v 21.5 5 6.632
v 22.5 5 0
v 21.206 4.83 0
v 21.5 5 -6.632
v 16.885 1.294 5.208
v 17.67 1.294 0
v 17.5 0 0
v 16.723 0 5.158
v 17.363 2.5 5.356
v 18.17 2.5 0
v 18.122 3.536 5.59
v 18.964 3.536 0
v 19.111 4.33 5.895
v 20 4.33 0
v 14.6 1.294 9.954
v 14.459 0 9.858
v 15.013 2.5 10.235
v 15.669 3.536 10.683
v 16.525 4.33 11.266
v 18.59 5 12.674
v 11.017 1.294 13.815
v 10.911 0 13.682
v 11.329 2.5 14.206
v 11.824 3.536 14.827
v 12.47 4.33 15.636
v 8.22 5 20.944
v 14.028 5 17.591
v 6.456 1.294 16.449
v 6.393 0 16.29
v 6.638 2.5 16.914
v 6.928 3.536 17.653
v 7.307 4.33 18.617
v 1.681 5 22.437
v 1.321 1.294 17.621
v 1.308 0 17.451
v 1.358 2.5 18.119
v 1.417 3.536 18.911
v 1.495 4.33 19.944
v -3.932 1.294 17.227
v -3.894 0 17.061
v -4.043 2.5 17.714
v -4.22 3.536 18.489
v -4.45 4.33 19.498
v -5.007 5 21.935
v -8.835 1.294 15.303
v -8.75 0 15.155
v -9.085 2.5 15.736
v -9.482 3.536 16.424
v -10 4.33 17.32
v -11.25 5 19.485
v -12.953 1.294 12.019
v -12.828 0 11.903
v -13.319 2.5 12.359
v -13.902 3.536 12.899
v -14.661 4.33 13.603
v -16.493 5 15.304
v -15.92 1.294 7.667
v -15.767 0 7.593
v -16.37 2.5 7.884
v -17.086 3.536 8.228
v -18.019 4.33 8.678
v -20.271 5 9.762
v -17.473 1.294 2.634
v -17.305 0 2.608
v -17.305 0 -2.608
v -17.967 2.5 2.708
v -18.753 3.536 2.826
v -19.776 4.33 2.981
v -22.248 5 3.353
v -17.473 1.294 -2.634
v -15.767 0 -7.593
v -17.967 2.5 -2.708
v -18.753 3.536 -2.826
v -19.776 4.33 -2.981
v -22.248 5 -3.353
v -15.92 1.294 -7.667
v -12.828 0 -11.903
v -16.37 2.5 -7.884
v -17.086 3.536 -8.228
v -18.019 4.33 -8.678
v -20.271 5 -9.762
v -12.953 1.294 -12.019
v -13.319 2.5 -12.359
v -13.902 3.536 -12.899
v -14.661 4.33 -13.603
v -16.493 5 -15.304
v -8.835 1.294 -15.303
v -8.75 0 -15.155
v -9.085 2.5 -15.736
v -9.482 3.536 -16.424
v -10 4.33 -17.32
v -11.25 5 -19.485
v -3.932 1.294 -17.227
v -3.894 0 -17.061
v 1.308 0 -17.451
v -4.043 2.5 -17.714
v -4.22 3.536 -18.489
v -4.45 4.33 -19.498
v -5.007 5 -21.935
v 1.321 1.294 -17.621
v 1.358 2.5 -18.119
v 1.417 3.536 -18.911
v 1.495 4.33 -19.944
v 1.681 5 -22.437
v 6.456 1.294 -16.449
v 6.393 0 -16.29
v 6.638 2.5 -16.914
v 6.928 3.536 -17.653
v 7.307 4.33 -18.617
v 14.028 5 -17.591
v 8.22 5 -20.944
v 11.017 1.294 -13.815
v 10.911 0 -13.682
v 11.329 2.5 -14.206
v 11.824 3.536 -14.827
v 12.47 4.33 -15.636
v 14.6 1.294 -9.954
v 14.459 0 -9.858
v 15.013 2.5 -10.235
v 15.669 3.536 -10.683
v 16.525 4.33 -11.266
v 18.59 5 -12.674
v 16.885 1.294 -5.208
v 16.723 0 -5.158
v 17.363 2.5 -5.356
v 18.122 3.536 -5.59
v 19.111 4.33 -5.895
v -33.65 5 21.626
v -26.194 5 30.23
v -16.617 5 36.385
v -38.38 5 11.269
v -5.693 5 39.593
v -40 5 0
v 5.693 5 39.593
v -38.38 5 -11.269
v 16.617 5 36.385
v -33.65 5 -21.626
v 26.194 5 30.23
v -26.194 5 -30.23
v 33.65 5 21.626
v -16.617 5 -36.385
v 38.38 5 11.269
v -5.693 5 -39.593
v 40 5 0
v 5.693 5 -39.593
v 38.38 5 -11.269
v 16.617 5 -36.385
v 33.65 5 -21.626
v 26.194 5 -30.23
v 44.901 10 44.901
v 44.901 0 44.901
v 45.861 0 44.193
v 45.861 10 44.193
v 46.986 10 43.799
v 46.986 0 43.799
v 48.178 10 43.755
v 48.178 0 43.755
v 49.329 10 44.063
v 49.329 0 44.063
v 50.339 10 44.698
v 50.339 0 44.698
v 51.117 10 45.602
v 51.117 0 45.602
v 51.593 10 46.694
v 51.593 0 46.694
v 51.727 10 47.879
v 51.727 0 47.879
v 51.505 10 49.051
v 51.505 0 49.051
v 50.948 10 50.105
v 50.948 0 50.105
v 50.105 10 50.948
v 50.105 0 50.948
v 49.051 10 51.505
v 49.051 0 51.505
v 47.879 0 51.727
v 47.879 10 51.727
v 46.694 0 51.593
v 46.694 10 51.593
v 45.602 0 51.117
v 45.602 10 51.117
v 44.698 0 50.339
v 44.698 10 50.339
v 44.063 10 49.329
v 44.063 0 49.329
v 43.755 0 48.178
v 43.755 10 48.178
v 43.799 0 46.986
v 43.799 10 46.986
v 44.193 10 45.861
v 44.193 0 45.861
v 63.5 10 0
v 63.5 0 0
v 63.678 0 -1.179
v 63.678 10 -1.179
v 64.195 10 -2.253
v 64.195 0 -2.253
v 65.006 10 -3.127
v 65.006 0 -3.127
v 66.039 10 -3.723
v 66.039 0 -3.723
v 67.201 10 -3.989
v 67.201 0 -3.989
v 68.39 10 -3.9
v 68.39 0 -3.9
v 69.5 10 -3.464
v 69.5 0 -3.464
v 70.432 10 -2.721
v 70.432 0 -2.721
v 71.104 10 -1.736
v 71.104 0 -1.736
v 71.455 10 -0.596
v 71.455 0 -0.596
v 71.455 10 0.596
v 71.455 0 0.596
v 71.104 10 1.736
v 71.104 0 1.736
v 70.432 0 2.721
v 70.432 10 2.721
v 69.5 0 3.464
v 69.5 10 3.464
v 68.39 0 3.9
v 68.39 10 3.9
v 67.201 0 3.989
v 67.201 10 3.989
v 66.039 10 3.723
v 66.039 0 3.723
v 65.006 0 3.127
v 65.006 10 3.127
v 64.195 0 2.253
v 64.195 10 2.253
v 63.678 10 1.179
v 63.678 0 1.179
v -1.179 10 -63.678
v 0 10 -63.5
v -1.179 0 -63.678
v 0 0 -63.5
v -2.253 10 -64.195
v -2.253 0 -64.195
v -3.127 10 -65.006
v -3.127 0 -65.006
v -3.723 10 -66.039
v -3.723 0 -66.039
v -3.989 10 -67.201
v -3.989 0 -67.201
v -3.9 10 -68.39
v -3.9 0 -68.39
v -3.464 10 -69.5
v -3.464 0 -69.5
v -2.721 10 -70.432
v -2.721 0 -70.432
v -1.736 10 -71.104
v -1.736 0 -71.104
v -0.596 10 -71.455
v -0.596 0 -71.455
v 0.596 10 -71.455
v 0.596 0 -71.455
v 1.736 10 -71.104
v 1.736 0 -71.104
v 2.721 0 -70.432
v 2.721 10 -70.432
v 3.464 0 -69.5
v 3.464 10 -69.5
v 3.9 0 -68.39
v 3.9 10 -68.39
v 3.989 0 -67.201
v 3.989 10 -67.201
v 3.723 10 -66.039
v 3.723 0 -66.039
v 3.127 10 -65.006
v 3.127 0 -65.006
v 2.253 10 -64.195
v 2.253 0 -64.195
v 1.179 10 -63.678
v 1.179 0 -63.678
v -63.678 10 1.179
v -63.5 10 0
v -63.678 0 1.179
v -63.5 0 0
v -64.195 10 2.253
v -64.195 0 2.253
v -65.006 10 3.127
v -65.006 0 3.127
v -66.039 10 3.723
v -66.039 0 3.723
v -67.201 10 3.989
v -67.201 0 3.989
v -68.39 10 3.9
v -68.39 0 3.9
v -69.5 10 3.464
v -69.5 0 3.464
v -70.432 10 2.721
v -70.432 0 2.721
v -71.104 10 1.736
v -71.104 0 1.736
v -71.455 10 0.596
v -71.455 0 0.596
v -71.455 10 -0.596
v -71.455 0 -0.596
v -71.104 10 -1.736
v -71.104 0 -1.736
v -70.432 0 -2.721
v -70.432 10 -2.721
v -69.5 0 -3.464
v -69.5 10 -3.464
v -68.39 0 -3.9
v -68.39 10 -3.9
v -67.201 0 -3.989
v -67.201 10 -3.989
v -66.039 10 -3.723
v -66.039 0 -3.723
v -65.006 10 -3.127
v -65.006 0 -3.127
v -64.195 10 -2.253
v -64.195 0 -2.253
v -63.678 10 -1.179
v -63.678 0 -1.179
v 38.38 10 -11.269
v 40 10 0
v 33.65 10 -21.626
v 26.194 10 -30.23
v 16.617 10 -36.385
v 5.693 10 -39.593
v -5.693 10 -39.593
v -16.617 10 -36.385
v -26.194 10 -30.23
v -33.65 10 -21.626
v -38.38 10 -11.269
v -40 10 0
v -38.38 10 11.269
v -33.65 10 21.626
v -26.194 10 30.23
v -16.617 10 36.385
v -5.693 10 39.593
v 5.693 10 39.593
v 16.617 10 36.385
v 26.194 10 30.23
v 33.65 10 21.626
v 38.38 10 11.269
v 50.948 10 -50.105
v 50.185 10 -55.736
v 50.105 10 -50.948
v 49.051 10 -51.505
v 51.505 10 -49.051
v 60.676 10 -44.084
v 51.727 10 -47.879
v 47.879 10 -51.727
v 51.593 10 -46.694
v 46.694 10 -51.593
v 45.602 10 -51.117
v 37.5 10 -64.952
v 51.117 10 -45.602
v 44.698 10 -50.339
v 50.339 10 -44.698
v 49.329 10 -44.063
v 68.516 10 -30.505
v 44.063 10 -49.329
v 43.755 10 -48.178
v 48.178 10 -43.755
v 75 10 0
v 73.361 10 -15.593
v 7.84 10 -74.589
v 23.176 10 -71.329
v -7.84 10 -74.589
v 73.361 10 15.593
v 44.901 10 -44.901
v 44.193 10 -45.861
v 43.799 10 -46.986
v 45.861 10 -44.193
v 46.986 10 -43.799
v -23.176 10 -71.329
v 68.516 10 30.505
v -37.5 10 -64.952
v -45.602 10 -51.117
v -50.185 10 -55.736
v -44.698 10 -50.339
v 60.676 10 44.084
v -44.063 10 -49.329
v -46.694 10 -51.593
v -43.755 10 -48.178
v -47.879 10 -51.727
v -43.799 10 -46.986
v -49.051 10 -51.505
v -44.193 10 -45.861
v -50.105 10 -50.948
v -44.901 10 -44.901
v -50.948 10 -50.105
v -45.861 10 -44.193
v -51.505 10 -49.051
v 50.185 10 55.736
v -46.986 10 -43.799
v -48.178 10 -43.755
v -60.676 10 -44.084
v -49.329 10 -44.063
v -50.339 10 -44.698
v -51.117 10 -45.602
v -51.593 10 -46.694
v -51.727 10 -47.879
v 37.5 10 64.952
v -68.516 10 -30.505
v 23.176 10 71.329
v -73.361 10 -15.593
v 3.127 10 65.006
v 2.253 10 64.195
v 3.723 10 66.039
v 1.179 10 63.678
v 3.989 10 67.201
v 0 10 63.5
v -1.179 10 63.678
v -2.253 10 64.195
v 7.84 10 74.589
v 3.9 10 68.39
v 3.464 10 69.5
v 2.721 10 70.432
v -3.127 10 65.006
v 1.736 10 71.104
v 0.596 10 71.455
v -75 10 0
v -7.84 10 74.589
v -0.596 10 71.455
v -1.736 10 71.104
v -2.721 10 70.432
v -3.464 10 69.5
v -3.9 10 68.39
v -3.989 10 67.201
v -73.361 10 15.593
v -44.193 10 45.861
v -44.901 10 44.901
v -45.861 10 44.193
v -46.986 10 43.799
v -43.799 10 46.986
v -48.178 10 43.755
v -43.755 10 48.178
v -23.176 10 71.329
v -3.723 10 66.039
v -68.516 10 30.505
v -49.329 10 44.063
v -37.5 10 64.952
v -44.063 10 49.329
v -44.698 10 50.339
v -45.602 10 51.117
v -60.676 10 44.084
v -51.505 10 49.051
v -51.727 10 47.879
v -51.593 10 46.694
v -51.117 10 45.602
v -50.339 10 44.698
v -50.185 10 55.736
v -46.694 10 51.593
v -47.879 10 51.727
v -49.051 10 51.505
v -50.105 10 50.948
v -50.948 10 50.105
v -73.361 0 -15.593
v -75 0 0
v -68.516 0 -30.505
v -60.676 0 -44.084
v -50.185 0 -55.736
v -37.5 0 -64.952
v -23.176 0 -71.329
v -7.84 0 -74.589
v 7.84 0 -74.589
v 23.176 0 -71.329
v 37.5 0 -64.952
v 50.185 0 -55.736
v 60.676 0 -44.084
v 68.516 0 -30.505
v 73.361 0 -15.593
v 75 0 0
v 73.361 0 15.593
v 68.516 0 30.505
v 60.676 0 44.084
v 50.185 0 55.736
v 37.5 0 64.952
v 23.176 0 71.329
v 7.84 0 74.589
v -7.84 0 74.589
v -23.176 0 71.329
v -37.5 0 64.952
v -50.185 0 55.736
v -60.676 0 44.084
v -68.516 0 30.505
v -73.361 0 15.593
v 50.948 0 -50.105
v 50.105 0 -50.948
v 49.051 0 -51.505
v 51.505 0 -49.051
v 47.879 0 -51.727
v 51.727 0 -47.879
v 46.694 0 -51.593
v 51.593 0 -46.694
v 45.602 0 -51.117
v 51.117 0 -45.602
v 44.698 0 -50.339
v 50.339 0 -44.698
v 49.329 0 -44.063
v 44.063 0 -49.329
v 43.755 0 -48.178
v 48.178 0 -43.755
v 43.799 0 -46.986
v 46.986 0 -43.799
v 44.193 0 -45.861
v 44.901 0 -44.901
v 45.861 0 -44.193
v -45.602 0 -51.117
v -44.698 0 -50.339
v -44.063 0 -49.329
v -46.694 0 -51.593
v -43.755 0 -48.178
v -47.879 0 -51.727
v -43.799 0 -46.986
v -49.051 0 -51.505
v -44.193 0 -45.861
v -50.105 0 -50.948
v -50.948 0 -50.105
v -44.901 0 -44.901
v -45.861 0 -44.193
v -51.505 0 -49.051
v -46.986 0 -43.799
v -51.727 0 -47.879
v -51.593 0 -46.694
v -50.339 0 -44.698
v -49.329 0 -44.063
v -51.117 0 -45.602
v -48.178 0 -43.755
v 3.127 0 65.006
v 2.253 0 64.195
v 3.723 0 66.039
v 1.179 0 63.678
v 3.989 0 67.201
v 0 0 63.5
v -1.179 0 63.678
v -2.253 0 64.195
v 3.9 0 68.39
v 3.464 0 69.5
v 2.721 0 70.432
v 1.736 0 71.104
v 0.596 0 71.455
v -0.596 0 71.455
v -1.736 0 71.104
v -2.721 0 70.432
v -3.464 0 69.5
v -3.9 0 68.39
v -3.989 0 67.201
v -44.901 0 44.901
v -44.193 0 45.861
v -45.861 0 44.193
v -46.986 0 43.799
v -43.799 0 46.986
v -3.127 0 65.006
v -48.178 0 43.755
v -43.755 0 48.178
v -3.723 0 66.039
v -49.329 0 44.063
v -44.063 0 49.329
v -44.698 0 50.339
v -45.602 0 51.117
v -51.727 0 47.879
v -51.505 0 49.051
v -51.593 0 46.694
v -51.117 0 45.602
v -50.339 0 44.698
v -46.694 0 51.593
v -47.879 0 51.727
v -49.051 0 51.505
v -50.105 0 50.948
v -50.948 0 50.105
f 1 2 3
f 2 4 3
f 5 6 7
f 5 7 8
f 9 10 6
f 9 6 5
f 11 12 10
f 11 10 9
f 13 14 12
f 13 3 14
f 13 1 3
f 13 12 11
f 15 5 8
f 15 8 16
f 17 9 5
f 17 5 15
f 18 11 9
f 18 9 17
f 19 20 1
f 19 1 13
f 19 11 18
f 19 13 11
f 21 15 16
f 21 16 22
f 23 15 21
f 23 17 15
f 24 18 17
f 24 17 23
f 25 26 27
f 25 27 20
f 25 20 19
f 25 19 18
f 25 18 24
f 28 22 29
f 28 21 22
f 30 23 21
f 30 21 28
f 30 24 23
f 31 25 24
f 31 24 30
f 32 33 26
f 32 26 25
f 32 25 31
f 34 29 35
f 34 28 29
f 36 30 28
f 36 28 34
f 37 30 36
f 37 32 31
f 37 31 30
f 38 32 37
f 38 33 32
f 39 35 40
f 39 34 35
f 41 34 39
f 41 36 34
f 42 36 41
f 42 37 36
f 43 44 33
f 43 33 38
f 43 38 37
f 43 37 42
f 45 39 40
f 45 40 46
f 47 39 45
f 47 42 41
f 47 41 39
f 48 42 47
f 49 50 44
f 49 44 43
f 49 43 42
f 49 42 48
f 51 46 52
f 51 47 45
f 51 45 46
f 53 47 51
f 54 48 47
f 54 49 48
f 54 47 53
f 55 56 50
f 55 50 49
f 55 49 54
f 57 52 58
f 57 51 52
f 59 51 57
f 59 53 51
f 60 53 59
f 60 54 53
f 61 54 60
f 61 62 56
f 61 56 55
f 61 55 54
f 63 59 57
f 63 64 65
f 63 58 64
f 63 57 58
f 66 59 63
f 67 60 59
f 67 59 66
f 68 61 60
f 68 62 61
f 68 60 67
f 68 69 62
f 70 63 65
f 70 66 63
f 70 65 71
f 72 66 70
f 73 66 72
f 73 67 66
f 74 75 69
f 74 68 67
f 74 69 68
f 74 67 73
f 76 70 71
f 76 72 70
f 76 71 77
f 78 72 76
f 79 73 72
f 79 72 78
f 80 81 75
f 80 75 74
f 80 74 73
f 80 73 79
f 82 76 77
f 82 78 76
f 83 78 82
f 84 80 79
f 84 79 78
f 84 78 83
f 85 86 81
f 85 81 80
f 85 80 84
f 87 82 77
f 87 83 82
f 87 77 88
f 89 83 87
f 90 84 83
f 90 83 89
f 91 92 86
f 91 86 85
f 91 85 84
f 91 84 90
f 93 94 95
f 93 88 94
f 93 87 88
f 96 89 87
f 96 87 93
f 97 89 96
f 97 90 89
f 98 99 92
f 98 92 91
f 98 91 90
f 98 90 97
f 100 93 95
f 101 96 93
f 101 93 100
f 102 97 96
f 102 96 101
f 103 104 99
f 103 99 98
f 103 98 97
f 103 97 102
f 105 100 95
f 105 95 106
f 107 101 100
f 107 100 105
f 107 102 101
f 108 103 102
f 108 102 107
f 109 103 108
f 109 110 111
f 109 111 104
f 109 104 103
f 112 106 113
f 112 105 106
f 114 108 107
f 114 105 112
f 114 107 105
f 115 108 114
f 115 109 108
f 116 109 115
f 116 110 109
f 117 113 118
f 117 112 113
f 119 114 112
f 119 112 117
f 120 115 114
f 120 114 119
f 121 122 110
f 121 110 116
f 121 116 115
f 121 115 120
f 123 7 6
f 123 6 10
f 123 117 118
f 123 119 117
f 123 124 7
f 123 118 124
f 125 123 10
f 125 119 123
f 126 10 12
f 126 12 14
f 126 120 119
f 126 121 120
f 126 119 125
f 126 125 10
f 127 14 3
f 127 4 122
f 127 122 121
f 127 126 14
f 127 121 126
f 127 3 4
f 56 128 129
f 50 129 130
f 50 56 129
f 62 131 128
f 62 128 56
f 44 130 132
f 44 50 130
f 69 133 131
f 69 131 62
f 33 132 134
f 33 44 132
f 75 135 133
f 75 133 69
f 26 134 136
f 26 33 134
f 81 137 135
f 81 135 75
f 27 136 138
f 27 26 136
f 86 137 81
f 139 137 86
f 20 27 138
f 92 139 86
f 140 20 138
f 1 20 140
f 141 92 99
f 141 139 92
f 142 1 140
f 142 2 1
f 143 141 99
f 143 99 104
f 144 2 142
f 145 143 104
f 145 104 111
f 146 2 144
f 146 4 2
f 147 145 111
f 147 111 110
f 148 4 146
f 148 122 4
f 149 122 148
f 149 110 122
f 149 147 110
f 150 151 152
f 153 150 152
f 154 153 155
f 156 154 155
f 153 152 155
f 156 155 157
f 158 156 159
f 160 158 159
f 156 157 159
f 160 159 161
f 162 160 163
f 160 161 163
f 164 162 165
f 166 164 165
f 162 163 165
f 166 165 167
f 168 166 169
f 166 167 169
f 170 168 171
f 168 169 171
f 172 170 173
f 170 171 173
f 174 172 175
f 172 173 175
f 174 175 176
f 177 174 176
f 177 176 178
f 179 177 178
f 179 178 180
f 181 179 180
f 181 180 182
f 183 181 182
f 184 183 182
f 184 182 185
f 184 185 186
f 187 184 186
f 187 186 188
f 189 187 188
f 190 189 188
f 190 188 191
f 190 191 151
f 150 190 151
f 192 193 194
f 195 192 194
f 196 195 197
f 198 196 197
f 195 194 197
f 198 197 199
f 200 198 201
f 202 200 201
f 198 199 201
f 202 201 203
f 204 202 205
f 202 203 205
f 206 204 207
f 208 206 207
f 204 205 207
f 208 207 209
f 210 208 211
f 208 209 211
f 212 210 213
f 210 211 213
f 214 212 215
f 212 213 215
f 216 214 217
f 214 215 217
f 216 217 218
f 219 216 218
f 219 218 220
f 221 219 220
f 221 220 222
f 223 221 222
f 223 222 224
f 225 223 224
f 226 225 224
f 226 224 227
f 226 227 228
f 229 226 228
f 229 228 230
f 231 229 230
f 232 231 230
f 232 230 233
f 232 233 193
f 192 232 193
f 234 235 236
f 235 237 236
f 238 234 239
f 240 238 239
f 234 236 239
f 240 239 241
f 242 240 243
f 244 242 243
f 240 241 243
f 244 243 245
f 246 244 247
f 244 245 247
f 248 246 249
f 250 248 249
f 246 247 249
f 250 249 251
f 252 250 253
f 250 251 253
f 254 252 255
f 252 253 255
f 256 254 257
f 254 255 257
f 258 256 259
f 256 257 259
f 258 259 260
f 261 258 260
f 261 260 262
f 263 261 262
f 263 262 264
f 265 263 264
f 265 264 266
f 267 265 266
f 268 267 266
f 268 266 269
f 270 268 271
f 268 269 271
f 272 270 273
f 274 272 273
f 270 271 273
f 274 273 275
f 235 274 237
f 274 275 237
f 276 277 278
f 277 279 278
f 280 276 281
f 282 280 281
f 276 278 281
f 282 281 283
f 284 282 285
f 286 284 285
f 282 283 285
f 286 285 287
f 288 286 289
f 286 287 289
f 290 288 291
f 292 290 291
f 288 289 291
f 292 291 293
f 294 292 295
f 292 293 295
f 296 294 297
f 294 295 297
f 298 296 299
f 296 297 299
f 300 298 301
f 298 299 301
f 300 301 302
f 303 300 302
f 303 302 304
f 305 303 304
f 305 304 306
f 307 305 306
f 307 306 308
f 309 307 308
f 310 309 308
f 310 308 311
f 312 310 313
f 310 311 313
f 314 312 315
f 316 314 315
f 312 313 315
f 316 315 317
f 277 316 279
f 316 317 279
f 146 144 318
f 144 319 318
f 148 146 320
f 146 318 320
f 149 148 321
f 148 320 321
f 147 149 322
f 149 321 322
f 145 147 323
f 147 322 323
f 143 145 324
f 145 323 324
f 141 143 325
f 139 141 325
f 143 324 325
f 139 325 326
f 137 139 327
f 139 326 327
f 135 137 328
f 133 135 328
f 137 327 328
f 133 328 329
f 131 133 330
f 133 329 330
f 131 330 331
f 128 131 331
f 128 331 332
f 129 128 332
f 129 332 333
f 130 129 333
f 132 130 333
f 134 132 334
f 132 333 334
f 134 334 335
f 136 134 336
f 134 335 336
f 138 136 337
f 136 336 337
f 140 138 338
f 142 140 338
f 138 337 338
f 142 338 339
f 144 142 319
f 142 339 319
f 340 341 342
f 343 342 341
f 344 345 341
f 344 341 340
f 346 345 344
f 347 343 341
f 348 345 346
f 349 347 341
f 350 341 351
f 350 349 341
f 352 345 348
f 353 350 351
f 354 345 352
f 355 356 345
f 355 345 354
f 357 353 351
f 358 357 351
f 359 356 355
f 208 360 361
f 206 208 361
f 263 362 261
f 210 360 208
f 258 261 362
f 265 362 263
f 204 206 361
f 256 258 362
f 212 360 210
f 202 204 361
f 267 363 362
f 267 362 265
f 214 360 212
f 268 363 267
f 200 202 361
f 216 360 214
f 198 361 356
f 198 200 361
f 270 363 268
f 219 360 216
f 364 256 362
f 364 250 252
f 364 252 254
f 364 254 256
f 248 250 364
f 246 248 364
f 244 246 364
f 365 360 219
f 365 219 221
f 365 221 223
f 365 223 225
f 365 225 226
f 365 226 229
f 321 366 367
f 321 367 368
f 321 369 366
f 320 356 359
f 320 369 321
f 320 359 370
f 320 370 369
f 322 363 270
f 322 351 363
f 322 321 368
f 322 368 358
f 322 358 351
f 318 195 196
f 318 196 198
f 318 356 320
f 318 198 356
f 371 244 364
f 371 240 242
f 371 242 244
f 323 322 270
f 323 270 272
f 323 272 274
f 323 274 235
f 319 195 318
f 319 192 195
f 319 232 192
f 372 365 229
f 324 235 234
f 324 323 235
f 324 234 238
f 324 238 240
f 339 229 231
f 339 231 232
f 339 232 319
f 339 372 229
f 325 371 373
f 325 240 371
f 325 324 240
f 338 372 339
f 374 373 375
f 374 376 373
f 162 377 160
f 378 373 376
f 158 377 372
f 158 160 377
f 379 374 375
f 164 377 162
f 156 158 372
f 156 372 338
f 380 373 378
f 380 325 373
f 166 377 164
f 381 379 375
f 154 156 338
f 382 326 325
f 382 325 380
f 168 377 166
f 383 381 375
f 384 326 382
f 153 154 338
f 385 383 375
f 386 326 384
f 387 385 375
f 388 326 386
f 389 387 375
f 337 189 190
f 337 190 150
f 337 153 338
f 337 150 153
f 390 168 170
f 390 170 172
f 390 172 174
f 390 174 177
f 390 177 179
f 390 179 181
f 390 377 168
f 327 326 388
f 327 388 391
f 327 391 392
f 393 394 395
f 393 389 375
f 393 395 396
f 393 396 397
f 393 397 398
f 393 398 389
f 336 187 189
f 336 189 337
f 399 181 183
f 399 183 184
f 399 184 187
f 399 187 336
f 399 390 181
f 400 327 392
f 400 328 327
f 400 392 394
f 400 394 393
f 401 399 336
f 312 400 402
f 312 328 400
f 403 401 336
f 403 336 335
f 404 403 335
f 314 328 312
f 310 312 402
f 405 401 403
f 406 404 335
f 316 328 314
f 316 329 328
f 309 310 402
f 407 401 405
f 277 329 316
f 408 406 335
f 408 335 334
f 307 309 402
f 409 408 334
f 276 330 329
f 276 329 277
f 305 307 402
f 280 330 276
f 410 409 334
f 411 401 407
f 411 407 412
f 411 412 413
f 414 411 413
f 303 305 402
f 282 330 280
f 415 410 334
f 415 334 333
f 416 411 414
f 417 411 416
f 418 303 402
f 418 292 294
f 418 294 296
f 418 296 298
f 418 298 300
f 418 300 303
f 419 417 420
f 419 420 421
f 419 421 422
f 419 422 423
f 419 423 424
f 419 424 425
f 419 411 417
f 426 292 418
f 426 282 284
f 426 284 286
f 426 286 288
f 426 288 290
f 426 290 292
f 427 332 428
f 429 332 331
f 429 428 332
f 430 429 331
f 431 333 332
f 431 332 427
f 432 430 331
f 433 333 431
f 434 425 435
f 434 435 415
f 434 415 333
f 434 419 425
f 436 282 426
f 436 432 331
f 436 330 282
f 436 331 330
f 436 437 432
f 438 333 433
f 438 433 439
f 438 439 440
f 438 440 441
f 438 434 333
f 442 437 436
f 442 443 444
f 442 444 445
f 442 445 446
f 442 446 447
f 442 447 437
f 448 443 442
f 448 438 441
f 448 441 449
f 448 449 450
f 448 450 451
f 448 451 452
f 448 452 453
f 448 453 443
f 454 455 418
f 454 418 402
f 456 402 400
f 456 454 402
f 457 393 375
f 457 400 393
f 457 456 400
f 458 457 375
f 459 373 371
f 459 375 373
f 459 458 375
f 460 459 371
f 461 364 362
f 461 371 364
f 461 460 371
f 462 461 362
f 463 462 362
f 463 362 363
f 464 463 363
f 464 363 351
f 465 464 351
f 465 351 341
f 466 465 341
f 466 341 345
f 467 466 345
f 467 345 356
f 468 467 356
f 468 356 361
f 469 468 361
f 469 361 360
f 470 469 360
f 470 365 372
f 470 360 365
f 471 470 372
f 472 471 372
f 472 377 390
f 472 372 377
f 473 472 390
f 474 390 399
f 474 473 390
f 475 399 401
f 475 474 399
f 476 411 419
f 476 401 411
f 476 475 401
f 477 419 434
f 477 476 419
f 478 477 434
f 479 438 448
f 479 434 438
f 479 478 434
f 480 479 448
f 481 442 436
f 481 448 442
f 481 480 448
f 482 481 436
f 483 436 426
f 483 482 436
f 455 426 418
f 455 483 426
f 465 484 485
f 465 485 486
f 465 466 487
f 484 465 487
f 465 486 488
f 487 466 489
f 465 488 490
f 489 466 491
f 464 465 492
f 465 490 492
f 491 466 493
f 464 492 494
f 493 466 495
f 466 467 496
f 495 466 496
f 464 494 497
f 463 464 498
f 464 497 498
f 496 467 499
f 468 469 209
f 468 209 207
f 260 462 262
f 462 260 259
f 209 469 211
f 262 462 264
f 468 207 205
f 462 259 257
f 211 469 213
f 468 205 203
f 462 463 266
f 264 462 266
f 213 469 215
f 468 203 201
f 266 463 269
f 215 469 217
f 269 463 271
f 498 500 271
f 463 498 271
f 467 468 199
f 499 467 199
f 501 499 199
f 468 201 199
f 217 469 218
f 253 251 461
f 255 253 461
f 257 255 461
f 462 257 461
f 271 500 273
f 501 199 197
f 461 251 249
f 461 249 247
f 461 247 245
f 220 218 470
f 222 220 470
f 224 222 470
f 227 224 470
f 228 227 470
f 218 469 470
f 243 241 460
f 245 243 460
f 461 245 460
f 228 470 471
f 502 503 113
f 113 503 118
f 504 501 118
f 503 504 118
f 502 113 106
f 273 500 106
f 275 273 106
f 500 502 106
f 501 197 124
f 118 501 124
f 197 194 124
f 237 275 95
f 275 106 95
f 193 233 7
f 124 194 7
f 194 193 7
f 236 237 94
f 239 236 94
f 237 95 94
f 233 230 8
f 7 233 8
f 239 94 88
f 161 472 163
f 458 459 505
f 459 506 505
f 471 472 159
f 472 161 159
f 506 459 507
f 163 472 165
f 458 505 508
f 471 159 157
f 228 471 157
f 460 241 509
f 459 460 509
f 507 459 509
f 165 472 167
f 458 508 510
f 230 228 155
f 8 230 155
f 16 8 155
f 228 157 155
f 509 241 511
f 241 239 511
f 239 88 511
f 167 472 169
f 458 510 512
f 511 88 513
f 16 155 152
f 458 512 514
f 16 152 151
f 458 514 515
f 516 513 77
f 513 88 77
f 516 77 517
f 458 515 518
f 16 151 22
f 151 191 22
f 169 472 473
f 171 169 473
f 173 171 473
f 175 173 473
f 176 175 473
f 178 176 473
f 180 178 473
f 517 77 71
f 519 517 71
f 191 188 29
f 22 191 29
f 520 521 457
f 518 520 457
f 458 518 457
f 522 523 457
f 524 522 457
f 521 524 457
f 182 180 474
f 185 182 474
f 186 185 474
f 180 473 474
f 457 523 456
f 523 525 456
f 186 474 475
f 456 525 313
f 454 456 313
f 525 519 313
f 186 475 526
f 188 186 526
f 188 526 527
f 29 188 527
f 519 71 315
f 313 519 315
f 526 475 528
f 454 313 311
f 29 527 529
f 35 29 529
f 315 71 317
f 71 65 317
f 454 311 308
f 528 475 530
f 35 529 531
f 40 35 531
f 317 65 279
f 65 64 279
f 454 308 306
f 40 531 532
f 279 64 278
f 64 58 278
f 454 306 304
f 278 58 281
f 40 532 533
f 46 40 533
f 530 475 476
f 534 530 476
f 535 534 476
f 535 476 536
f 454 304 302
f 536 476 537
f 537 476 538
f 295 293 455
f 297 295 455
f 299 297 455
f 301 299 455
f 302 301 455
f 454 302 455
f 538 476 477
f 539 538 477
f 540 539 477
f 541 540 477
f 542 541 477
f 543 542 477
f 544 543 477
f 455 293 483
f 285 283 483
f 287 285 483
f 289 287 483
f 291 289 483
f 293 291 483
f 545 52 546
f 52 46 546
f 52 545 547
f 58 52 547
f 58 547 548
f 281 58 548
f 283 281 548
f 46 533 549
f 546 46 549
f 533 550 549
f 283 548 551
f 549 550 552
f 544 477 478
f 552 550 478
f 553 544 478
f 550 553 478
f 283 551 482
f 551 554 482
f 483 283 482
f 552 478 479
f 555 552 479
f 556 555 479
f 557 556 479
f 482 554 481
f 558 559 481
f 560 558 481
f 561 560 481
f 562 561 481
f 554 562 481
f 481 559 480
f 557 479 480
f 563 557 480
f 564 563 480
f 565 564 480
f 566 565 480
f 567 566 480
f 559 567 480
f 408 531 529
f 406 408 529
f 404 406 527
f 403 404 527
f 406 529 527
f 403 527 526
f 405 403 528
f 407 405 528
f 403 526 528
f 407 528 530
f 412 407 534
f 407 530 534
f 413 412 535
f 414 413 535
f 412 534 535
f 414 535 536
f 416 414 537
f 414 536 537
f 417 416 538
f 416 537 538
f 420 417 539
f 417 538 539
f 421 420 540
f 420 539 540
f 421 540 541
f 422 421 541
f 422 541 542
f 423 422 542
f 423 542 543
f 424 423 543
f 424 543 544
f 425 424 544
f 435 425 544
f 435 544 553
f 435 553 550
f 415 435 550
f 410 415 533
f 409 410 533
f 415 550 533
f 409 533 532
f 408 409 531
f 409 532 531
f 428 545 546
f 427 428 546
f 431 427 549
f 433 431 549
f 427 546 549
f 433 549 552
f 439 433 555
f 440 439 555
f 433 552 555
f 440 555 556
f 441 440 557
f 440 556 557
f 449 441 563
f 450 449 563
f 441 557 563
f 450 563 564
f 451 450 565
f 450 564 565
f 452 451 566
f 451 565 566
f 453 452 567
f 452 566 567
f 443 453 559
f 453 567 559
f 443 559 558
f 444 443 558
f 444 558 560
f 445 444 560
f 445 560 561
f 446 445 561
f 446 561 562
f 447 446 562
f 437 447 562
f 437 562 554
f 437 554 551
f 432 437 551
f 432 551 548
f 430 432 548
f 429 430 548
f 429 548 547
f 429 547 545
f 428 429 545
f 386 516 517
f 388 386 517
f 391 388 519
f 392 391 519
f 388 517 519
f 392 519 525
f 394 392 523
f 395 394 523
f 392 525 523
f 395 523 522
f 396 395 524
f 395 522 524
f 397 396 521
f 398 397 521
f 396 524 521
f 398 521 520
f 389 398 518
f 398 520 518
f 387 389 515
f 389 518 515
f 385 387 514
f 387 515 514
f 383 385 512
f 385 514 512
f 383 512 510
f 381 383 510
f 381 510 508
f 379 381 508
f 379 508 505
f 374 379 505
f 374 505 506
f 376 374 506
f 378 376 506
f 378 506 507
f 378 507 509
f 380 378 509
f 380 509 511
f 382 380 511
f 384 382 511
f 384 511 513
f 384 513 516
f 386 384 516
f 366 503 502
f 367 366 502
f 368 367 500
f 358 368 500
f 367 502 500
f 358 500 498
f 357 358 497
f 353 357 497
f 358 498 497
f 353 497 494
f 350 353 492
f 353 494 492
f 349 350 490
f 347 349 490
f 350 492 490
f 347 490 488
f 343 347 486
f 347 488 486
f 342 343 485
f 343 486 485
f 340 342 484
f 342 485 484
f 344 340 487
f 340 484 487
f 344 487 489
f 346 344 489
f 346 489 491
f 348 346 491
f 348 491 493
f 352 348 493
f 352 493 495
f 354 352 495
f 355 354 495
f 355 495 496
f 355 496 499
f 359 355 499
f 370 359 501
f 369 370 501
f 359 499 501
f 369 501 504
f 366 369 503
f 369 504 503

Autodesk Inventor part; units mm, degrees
ref_plane "YZ Plane" through (0, 0, 0) normal (1, 0, 0) x (0, 1, 0)
ref_plane "XZ Plane" through (0, 0, 0) normal (0, 1, 0) x (-1, 0, 0)
ref_plane "XY Plane" through (0, 0, 0) normal (0, 0, 1) x (1, 0, 0)
sketch "Sketch1" plane through (0, 0, 0) normal (0, 1, 0) x (-1, 0, 0)
  circle A0 centre (0, 0) radius 75
  dimension "d0" = 150
extrude "Extrusion1" add sketch "Sketch1" along normal blind 10
sketch "Sketch2" plane through (0, 10, 0) normal (0, 1, 0) x (1, 0, 0)
  circle A0 centre (0, 0) radius 17.5
  dimension "d5" = 35
extrude "Extrusion2" cut sketch "Sketch2" against normal blind 10
sketch "Sketch3" plane through (0, 10, 0) normal (0, 1, 0) x (1, 0, 0)
  circle A0 centre (0, 0) radius 40
  dimension "d8" = 80
extrude "Extrusion3" cut sketch "Sketch3" against normal blind 5
fillet "Fillet2" radius 5 1 edges at (-17.5, 5, 0)
sketch "Sketch5" plane through (0, 10, 0) normal (0, 1, 0) x (1, 0, 0)
  circle A0 centre (0, 0) radius 67.5 construction
  circle A1 centre (0, 67.5) radius 4
  dimension "d46" = 135
  dimension "d47" = 8
hole "Hole2" at (0, 10, -67.5) direction (0, -1, 0) diameter 8 end through all
pattern_circular "Circular Pattern2" count 8 over 360 about axis through (0, -10, 0) along (0, 1, 0) of "Hole2"
properties part number "faceplate" material "Stainless Steel"
